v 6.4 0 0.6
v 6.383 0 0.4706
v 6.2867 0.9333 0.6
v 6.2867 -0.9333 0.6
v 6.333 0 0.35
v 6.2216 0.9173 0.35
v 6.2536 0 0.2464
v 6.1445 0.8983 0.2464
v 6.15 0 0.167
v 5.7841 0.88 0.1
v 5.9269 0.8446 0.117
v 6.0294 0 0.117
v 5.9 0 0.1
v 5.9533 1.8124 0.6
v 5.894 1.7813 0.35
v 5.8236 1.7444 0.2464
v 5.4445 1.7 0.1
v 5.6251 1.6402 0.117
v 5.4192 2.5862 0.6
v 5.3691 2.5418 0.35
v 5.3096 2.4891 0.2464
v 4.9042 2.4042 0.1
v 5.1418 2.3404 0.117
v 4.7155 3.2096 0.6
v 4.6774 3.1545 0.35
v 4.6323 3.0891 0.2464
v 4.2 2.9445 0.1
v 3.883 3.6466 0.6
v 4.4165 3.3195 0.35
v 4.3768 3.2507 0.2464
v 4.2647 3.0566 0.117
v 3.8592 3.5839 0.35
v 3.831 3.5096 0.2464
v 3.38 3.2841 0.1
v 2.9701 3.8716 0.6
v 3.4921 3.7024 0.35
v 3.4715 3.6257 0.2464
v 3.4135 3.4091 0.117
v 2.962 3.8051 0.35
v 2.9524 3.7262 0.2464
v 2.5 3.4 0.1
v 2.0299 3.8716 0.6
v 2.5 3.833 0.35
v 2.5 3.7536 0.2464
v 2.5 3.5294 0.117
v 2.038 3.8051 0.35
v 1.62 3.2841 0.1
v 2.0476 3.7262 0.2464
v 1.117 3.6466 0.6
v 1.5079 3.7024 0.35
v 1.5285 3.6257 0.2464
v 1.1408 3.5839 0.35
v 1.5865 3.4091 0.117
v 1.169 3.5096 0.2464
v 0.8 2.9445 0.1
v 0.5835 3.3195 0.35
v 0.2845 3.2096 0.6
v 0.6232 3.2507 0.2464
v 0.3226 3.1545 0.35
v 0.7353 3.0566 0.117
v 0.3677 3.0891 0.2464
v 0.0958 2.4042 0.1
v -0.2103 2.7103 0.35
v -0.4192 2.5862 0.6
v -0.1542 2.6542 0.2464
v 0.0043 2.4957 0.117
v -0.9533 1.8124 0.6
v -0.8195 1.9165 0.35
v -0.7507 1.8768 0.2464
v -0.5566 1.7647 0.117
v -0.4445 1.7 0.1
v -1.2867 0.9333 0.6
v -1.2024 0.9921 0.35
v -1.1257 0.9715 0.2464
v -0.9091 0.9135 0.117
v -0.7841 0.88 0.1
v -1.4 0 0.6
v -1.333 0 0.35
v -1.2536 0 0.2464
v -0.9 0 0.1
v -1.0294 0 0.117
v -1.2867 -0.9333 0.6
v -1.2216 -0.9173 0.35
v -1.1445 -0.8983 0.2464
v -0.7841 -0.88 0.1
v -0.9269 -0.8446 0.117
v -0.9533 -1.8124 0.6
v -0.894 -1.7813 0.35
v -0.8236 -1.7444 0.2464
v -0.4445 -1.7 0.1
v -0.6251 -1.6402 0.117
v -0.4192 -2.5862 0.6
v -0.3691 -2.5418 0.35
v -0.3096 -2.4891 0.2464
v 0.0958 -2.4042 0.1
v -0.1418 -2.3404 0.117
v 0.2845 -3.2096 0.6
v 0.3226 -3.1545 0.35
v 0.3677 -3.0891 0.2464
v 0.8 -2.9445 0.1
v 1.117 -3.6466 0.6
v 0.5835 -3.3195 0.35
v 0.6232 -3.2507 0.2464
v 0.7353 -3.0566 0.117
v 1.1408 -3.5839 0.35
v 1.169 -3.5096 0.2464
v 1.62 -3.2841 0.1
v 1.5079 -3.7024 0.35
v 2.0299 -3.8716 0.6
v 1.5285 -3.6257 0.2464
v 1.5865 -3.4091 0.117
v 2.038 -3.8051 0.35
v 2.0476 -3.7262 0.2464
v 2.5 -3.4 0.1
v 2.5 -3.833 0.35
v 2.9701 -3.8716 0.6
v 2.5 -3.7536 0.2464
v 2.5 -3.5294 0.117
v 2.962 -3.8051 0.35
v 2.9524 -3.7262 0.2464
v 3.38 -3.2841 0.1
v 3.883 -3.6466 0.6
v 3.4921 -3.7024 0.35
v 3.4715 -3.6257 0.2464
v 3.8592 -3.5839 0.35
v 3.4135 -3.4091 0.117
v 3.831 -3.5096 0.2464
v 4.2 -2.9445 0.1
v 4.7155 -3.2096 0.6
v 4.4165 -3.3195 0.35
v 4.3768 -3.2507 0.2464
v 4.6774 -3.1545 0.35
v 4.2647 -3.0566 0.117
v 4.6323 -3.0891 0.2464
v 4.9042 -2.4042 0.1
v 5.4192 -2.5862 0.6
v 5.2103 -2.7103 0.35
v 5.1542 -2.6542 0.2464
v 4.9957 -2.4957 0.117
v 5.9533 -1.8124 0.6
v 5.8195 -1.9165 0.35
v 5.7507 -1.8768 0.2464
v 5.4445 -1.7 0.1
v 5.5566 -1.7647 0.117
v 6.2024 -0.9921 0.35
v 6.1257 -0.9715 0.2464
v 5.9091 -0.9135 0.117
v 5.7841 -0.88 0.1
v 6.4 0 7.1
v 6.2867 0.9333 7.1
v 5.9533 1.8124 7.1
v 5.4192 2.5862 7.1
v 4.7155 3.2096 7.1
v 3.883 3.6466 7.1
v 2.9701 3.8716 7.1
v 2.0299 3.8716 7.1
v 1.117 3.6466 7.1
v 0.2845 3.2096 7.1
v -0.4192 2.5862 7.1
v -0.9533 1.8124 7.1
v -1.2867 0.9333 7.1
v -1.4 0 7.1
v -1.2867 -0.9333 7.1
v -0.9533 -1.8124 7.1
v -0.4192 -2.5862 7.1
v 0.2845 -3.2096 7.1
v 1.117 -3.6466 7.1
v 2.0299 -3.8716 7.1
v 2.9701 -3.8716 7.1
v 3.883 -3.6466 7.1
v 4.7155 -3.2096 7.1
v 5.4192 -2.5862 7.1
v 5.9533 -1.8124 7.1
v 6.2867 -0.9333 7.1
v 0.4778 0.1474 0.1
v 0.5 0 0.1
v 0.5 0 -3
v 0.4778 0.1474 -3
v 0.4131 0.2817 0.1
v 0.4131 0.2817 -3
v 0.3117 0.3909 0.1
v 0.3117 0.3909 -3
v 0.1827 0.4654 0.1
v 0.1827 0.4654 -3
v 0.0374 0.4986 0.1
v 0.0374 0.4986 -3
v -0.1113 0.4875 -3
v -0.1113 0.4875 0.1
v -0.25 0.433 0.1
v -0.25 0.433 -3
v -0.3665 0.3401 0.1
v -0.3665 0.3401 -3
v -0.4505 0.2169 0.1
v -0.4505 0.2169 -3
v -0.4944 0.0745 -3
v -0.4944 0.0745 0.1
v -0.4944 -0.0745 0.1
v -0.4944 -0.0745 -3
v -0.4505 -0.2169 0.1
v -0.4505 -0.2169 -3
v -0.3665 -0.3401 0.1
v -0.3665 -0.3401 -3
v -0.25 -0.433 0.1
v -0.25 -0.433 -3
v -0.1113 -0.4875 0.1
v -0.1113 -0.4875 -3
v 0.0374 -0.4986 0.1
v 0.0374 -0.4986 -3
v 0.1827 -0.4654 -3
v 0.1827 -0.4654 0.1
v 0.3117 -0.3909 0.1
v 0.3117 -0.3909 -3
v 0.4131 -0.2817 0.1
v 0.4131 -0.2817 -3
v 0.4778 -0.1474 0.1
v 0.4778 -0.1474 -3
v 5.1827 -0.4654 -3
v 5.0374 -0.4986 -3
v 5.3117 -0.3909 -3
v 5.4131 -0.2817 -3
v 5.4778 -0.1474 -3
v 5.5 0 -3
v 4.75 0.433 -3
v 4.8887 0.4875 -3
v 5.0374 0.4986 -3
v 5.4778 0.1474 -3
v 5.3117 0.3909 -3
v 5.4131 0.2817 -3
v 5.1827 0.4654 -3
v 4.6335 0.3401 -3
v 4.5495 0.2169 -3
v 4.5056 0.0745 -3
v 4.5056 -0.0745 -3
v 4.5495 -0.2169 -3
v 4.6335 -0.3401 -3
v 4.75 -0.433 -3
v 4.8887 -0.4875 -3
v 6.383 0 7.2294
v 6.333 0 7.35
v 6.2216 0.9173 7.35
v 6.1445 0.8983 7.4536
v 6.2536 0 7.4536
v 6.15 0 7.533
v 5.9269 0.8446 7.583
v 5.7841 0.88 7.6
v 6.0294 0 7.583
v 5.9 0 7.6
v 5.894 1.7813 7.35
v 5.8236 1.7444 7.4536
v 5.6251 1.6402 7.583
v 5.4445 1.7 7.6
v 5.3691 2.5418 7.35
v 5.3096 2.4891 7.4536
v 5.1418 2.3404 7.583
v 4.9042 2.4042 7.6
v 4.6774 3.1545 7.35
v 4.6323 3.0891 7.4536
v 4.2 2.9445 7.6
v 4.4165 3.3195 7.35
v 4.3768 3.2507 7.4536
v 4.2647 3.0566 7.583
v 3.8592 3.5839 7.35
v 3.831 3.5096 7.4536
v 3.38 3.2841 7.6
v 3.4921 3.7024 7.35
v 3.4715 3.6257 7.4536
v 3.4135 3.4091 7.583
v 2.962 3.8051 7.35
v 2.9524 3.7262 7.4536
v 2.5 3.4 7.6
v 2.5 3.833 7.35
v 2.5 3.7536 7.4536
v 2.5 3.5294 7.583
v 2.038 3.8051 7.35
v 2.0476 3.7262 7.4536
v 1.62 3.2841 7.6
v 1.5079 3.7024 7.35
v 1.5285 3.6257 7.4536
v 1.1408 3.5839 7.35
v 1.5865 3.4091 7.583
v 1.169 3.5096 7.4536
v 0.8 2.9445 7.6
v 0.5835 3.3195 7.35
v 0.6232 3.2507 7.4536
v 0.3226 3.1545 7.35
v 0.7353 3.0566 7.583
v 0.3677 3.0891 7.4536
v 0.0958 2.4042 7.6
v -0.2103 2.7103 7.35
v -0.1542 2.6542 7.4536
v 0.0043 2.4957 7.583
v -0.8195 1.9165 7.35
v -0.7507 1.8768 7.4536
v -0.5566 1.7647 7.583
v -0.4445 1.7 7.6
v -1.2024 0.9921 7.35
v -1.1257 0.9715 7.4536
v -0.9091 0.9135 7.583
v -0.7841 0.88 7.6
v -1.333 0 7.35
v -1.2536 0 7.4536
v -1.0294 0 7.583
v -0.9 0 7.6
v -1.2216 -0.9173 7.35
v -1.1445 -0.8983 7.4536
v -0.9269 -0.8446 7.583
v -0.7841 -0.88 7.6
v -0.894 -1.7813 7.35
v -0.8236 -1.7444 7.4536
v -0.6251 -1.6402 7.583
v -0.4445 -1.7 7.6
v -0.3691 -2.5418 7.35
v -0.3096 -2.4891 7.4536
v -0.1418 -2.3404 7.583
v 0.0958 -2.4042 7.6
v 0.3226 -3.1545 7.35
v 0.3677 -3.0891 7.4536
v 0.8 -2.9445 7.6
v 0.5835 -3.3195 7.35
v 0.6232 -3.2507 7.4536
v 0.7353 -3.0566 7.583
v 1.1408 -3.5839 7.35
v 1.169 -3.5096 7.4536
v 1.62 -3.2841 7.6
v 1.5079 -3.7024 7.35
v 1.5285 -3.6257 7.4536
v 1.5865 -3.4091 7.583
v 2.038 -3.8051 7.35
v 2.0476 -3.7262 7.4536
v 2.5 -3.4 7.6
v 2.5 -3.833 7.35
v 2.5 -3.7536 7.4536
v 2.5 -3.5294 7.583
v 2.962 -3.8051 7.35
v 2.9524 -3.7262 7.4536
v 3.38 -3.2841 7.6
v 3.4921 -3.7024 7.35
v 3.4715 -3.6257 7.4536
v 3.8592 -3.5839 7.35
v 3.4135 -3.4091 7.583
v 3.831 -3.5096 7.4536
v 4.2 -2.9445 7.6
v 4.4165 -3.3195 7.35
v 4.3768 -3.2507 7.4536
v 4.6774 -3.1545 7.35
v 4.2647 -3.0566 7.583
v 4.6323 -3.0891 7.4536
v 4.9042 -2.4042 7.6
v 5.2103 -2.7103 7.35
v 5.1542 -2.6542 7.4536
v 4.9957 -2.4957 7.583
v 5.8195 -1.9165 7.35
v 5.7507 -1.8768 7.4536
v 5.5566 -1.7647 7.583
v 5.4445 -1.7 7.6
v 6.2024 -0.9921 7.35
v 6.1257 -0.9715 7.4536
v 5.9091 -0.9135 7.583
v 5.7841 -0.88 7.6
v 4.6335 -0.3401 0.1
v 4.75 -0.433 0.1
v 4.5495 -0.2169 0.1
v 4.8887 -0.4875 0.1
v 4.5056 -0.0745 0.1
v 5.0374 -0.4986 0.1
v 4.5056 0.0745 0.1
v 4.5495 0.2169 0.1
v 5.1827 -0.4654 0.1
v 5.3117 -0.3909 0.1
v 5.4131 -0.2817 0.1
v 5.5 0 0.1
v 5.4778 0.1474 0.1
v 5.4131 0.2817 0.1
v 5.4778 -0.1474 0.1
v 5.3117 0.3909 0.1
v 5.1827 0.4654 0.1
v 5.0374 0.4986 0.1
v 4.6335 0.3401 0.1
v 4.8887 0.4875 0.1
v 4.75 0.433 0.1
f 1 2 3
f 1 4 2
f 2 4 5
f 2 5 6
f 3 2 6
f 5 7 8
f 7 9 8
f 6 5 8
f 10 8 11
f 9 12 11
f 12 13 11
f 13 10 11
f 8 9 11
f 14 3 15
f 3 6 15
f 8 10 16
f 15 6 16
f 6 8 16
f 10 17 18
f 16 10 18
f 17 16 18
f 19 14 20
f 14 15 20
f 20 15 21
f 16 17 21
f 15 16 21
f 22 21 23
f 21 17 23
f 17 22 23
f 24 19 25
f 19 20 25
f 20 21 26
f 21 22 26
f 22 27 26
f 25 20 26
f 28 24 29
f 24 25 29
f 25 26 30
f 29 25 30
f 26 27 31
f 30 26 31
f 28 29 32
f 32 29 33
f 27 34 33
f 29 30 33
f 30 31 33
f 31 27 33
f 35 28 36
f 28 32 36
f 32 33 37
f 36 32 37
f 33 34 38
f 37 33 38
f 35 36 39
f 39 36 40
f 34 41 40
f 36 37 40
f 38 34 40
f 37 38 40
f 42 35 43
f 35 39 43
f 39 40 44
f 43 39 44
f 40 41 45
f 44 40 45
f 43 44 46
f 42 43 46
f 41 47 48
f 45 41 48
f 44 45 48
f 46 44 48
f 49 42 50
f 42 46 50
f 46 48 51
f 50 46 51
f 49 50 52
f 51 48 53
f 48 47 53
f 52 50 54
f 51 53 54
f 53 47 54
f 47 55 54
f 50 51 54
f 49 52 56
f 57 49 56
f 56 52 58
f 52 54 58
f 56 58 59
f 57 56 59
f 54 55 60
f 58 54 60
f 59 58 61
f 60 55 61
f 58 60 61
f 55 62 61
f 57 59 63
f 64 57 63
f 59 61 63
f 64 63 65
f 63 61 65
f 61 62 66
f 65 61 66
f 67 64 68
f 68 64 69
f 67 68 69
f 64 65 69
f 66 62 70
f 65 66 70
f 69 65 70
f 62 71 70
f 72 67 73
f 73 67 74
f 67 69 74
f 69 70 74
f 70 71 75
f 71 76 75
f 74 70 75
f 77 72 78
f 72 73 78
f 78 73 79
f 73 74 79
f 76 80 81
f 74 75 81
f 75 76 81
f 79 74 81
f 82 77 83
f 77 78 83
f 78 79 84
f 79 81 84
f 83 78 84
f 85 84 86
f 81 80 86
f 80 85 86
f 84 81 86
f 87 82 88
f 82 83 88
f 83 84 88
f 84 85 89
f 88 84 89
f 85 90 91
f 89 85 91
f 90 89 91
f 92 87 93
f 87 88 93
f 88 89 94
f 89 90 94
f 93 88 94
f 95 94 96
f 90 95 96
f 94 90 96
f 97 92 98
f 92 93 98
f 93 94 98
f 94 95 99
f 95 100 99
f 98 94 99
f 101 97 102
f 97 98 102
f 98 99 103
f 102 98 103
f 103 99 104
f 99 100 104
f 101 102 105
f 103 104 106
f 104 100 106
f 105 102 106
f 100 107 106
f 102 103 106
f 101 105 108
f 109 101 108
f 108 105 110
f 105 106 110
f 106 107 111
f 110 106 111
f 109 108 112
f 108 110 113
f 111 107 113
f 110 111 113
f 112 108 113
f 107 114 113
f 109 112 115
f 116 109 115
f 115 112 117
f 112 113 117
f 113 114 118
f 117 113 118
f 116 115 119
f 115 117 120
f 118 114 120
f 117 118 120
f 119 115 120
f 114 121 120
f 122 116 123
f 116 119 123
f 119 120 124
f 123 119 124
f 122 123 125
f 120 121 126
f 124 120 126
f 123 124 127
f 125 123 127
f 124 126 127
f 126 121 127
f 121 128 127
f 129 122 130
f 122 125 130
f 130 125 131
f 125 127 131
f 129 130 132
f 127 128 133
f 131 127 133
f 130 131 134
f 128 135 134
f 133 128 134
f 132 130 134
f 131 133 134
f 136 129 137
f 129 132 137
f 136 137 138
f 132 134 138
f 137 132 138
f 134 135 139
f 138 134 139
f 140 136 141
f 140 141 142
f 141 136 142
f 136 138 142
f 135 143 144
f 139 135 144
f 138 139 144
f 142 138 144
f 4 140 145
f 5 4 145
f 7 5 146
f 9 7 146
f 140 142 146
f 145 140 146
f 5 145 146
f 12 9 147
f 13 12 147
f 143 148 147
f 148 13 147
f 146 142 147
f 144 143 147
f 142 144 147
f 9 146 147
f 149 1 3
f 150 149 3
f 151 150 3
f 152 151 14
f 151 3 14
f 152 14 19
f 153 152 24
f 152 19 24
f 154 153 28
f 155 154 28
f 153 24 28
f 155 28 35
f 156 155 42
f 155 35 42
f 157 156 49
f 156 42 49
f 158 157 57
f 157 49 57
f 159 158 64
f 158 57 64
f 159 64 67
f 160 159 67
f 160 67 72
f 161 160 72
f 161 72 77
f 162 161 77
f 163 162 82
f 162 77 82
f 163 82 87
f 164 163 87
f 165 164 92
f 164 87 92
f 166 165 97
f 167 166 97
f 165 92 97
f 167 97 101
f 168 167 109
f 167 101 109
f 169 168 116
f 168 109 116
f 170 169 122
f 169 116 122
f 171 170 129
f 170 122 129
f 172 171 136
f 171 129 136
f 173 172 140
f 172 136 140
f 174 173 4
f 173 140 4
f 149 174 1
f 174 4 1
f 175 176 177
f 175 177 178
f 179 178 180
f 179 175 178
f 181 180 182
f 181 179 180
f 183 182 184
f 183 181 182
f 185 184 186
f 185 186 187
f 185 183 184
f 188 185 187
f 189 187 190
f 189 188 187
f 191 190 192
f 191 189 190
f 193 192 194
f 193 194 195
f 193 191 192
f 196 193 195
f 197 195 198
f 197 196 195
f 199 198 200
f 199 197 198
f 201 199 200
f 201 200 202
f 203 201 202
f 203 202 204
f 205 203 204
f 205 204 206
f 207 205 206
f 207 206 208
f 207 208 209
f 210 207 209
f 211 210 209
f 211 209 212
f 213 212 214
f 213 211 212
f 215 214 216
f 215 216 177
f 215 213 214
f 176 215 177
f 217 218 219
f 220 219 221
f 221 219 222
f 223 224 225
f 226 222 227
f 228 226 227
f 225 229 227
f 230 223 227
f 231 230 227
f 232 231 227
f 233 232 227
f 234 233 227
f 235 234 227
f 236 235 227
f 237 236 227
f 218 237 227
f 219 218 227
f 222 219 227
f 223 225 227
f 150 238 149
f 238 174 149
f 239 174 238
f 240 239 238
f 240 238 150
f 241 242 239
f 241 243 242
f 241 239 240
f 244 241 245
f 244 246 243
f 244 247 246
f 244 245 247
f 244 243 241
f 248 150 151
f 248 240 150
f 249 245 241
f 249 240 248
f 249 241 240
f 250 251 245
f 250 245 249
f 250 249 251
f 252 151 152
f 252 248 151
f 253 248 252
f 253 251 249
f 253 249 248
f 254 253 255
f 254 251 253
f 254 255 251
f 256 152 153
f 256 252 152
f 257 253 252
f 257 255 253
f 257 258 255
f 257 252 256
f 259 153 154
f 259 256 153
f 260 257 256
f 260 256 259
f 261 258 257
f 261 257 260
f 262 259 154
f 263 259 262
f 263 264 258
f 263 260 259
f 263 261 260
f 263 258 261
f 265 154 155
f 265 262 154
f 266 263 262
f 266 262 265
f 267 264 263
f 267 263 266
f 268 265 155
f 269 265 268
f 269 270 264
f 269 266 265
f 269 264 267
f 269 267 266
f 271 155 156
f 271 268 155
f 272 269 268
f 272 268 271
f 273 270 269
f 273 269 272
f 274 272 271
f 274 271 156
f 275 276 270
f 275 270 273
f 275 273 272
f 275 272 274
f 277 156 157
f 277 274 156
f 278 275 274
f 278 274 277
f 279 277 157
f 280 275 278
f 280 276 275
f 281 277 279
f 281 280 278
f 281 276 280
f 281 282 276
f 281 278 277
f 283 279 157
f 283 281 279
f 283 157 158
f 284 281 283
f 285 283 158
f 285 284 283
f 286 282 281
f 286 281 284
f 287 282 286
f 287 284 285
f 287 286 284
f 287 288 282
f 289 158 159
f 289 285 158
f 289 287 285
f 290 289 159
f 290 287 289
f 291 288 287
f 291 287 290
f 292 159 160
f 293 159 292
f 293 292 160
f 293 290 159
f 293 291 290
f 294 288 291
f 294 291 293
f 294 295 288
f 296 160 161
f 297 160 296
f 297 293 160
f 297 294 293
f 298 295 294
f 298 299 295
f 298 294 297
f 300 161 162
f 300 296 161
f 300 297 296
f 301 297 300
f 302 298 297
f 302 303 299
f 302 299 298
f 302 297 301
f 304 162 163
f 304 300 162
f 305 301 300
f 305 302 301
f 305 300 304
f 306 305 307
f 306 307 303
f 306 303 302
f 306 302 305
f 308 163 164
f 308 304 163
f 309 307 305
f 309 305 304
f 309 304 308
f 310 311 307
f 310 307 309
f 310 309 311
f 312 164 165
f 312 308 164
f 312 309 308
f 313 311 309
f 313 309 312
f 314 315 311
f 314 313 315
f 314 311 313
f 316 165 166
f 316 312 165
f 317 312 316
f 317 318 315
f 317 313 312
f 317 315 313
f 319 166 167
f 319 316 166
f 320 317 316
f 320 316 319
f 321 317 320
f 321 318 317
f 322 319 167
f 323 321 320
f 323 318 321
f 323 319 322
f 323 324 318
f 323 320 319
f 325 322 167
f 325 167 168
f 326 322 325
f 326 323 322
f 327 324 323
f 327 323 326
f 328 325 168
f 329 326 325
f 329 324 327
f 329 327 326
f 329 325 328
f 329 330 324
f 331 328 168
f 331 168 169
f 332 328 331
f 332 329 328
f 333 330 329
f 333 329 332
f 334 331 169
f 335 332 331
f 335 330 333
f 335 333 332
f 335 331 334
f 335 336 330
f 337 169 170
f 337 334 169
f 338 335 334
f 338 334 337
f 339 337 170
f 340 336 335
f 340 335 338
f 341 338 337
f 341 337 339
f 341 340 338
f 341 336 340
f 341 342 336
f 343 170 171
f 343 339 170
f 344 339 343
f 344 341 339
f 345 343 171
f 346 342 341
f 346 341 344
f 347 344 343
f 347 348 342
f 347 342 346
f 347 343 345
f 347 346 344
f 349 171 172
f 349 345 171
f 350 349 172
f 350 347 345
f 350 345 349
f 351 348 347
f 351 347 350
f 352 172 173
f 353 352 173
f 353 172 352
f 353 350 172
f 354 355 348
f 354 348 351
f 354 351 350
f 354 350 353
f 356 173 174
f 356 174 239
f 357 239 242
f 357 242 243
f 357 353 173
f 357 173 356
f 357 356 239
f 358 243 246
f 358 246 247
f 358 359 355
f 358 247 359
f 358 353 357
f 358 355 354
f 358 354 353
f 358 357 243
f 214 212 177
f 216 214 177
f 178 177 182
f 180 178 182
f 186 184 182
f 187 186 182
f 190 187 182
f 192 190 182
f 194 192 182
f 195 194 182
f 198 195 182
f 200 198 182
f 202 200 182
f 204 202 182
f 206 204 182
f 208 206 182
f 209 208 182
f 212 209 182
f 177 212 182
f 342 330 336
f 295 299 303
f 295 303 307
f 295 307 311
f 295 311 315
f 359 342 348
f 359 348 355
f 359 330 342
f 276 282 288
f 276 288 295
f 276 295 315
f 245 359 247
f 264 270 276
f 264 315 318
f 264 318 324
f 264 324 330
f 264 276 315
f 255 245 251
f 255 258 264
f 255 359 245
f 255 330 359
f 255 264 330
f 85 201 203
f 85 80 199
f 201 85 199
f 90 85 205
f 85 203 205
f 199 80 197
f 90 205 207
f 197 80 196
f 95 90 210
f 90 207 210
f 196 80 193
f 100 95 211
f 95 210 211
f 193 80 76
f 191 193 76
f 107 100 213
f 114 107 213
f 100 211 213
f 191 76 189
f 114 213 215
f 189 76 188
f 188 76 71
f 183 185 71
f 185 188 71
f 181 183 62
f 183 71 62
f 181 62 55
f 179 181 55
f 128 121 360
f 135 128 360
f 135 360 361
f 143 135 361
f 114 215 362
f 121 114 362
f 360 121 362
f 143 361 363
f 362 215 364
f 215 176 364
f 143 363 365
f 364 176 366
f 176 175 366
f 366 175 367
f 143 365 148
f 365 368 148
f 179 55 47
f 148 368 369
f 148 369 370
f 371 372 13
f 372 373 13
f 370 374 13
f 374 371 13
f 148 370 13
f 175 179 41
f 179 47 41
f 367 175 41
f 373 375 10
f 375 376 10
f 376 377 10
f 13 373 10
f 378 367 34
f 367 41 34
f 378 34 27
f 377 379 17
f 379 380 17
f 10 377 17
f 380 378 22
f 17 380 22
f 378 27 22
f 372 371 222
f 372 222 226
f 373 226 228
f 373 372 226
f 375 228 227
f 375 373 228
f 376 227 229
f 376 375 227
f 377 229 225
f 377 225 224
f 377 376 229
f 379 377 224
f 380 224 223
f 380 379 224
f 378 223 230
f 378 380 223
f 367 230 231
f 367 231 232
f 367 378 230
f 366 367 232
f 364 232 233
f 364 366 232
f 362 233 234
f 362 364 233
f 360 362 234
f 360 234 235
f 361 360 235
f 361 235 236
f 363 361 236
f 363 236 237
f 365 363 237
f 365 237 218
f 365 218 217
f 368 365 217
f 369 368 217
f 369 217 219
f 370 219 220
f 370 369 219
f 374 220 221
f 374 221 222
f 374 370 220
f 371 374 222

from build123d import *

# Parameters (mm, degrees)
SKETCH001_R       = 0.5
PAD001_DEPTH      = 3.75
PAD001_DEPTH_BACK = 3.5
SKETCH_R          = 3.9
PAD_DEPTH         = 7.5
FILLET_R          = 0.5


with BuildPart() as pad001:
    # Sketch001 → Pad001 (new body, two sides)
    with BuildSketch(Plane.XY.offset(0.5)) as pad001_sk:
        Circle(SKETCH001_R)
        with Locations((5, 0)):
            Circle(SKETCH001_R)
    extrude(amount=PAD001_DEPTH)
    extrude(pad001_sk.sketch, amount=-PAD001_DEPTH_BACK)


with BuildPart() as l_radial_d7_8mm_p5_00mm_fastron_07hcp:
    # Sketch → Pad (new body)
    with BuildSketch(Plane.XY.offset(0.1)):
        with Locations((2.5, 0)):
            Circle(SKETCH_R)
    extrude(amount=PAD_DEPTH)

    # Fillet
    fillet_edges = [l_radial_d7_8mm_p5_00mm_fastron_07hcp.edges().sort_by_distance(p)[0] for p in [
        (-1.4, 0, 0.1),
        (-1.4, 0, 7.6),
    ]]
    fillet(fillet_edges, radius=FILLET_R)

    # Fillet_mp_cp: union Pad001
    add(pad001.part)


solid = l_radial_d7_8mm_p5_00mm_fastron_07hcp.part
